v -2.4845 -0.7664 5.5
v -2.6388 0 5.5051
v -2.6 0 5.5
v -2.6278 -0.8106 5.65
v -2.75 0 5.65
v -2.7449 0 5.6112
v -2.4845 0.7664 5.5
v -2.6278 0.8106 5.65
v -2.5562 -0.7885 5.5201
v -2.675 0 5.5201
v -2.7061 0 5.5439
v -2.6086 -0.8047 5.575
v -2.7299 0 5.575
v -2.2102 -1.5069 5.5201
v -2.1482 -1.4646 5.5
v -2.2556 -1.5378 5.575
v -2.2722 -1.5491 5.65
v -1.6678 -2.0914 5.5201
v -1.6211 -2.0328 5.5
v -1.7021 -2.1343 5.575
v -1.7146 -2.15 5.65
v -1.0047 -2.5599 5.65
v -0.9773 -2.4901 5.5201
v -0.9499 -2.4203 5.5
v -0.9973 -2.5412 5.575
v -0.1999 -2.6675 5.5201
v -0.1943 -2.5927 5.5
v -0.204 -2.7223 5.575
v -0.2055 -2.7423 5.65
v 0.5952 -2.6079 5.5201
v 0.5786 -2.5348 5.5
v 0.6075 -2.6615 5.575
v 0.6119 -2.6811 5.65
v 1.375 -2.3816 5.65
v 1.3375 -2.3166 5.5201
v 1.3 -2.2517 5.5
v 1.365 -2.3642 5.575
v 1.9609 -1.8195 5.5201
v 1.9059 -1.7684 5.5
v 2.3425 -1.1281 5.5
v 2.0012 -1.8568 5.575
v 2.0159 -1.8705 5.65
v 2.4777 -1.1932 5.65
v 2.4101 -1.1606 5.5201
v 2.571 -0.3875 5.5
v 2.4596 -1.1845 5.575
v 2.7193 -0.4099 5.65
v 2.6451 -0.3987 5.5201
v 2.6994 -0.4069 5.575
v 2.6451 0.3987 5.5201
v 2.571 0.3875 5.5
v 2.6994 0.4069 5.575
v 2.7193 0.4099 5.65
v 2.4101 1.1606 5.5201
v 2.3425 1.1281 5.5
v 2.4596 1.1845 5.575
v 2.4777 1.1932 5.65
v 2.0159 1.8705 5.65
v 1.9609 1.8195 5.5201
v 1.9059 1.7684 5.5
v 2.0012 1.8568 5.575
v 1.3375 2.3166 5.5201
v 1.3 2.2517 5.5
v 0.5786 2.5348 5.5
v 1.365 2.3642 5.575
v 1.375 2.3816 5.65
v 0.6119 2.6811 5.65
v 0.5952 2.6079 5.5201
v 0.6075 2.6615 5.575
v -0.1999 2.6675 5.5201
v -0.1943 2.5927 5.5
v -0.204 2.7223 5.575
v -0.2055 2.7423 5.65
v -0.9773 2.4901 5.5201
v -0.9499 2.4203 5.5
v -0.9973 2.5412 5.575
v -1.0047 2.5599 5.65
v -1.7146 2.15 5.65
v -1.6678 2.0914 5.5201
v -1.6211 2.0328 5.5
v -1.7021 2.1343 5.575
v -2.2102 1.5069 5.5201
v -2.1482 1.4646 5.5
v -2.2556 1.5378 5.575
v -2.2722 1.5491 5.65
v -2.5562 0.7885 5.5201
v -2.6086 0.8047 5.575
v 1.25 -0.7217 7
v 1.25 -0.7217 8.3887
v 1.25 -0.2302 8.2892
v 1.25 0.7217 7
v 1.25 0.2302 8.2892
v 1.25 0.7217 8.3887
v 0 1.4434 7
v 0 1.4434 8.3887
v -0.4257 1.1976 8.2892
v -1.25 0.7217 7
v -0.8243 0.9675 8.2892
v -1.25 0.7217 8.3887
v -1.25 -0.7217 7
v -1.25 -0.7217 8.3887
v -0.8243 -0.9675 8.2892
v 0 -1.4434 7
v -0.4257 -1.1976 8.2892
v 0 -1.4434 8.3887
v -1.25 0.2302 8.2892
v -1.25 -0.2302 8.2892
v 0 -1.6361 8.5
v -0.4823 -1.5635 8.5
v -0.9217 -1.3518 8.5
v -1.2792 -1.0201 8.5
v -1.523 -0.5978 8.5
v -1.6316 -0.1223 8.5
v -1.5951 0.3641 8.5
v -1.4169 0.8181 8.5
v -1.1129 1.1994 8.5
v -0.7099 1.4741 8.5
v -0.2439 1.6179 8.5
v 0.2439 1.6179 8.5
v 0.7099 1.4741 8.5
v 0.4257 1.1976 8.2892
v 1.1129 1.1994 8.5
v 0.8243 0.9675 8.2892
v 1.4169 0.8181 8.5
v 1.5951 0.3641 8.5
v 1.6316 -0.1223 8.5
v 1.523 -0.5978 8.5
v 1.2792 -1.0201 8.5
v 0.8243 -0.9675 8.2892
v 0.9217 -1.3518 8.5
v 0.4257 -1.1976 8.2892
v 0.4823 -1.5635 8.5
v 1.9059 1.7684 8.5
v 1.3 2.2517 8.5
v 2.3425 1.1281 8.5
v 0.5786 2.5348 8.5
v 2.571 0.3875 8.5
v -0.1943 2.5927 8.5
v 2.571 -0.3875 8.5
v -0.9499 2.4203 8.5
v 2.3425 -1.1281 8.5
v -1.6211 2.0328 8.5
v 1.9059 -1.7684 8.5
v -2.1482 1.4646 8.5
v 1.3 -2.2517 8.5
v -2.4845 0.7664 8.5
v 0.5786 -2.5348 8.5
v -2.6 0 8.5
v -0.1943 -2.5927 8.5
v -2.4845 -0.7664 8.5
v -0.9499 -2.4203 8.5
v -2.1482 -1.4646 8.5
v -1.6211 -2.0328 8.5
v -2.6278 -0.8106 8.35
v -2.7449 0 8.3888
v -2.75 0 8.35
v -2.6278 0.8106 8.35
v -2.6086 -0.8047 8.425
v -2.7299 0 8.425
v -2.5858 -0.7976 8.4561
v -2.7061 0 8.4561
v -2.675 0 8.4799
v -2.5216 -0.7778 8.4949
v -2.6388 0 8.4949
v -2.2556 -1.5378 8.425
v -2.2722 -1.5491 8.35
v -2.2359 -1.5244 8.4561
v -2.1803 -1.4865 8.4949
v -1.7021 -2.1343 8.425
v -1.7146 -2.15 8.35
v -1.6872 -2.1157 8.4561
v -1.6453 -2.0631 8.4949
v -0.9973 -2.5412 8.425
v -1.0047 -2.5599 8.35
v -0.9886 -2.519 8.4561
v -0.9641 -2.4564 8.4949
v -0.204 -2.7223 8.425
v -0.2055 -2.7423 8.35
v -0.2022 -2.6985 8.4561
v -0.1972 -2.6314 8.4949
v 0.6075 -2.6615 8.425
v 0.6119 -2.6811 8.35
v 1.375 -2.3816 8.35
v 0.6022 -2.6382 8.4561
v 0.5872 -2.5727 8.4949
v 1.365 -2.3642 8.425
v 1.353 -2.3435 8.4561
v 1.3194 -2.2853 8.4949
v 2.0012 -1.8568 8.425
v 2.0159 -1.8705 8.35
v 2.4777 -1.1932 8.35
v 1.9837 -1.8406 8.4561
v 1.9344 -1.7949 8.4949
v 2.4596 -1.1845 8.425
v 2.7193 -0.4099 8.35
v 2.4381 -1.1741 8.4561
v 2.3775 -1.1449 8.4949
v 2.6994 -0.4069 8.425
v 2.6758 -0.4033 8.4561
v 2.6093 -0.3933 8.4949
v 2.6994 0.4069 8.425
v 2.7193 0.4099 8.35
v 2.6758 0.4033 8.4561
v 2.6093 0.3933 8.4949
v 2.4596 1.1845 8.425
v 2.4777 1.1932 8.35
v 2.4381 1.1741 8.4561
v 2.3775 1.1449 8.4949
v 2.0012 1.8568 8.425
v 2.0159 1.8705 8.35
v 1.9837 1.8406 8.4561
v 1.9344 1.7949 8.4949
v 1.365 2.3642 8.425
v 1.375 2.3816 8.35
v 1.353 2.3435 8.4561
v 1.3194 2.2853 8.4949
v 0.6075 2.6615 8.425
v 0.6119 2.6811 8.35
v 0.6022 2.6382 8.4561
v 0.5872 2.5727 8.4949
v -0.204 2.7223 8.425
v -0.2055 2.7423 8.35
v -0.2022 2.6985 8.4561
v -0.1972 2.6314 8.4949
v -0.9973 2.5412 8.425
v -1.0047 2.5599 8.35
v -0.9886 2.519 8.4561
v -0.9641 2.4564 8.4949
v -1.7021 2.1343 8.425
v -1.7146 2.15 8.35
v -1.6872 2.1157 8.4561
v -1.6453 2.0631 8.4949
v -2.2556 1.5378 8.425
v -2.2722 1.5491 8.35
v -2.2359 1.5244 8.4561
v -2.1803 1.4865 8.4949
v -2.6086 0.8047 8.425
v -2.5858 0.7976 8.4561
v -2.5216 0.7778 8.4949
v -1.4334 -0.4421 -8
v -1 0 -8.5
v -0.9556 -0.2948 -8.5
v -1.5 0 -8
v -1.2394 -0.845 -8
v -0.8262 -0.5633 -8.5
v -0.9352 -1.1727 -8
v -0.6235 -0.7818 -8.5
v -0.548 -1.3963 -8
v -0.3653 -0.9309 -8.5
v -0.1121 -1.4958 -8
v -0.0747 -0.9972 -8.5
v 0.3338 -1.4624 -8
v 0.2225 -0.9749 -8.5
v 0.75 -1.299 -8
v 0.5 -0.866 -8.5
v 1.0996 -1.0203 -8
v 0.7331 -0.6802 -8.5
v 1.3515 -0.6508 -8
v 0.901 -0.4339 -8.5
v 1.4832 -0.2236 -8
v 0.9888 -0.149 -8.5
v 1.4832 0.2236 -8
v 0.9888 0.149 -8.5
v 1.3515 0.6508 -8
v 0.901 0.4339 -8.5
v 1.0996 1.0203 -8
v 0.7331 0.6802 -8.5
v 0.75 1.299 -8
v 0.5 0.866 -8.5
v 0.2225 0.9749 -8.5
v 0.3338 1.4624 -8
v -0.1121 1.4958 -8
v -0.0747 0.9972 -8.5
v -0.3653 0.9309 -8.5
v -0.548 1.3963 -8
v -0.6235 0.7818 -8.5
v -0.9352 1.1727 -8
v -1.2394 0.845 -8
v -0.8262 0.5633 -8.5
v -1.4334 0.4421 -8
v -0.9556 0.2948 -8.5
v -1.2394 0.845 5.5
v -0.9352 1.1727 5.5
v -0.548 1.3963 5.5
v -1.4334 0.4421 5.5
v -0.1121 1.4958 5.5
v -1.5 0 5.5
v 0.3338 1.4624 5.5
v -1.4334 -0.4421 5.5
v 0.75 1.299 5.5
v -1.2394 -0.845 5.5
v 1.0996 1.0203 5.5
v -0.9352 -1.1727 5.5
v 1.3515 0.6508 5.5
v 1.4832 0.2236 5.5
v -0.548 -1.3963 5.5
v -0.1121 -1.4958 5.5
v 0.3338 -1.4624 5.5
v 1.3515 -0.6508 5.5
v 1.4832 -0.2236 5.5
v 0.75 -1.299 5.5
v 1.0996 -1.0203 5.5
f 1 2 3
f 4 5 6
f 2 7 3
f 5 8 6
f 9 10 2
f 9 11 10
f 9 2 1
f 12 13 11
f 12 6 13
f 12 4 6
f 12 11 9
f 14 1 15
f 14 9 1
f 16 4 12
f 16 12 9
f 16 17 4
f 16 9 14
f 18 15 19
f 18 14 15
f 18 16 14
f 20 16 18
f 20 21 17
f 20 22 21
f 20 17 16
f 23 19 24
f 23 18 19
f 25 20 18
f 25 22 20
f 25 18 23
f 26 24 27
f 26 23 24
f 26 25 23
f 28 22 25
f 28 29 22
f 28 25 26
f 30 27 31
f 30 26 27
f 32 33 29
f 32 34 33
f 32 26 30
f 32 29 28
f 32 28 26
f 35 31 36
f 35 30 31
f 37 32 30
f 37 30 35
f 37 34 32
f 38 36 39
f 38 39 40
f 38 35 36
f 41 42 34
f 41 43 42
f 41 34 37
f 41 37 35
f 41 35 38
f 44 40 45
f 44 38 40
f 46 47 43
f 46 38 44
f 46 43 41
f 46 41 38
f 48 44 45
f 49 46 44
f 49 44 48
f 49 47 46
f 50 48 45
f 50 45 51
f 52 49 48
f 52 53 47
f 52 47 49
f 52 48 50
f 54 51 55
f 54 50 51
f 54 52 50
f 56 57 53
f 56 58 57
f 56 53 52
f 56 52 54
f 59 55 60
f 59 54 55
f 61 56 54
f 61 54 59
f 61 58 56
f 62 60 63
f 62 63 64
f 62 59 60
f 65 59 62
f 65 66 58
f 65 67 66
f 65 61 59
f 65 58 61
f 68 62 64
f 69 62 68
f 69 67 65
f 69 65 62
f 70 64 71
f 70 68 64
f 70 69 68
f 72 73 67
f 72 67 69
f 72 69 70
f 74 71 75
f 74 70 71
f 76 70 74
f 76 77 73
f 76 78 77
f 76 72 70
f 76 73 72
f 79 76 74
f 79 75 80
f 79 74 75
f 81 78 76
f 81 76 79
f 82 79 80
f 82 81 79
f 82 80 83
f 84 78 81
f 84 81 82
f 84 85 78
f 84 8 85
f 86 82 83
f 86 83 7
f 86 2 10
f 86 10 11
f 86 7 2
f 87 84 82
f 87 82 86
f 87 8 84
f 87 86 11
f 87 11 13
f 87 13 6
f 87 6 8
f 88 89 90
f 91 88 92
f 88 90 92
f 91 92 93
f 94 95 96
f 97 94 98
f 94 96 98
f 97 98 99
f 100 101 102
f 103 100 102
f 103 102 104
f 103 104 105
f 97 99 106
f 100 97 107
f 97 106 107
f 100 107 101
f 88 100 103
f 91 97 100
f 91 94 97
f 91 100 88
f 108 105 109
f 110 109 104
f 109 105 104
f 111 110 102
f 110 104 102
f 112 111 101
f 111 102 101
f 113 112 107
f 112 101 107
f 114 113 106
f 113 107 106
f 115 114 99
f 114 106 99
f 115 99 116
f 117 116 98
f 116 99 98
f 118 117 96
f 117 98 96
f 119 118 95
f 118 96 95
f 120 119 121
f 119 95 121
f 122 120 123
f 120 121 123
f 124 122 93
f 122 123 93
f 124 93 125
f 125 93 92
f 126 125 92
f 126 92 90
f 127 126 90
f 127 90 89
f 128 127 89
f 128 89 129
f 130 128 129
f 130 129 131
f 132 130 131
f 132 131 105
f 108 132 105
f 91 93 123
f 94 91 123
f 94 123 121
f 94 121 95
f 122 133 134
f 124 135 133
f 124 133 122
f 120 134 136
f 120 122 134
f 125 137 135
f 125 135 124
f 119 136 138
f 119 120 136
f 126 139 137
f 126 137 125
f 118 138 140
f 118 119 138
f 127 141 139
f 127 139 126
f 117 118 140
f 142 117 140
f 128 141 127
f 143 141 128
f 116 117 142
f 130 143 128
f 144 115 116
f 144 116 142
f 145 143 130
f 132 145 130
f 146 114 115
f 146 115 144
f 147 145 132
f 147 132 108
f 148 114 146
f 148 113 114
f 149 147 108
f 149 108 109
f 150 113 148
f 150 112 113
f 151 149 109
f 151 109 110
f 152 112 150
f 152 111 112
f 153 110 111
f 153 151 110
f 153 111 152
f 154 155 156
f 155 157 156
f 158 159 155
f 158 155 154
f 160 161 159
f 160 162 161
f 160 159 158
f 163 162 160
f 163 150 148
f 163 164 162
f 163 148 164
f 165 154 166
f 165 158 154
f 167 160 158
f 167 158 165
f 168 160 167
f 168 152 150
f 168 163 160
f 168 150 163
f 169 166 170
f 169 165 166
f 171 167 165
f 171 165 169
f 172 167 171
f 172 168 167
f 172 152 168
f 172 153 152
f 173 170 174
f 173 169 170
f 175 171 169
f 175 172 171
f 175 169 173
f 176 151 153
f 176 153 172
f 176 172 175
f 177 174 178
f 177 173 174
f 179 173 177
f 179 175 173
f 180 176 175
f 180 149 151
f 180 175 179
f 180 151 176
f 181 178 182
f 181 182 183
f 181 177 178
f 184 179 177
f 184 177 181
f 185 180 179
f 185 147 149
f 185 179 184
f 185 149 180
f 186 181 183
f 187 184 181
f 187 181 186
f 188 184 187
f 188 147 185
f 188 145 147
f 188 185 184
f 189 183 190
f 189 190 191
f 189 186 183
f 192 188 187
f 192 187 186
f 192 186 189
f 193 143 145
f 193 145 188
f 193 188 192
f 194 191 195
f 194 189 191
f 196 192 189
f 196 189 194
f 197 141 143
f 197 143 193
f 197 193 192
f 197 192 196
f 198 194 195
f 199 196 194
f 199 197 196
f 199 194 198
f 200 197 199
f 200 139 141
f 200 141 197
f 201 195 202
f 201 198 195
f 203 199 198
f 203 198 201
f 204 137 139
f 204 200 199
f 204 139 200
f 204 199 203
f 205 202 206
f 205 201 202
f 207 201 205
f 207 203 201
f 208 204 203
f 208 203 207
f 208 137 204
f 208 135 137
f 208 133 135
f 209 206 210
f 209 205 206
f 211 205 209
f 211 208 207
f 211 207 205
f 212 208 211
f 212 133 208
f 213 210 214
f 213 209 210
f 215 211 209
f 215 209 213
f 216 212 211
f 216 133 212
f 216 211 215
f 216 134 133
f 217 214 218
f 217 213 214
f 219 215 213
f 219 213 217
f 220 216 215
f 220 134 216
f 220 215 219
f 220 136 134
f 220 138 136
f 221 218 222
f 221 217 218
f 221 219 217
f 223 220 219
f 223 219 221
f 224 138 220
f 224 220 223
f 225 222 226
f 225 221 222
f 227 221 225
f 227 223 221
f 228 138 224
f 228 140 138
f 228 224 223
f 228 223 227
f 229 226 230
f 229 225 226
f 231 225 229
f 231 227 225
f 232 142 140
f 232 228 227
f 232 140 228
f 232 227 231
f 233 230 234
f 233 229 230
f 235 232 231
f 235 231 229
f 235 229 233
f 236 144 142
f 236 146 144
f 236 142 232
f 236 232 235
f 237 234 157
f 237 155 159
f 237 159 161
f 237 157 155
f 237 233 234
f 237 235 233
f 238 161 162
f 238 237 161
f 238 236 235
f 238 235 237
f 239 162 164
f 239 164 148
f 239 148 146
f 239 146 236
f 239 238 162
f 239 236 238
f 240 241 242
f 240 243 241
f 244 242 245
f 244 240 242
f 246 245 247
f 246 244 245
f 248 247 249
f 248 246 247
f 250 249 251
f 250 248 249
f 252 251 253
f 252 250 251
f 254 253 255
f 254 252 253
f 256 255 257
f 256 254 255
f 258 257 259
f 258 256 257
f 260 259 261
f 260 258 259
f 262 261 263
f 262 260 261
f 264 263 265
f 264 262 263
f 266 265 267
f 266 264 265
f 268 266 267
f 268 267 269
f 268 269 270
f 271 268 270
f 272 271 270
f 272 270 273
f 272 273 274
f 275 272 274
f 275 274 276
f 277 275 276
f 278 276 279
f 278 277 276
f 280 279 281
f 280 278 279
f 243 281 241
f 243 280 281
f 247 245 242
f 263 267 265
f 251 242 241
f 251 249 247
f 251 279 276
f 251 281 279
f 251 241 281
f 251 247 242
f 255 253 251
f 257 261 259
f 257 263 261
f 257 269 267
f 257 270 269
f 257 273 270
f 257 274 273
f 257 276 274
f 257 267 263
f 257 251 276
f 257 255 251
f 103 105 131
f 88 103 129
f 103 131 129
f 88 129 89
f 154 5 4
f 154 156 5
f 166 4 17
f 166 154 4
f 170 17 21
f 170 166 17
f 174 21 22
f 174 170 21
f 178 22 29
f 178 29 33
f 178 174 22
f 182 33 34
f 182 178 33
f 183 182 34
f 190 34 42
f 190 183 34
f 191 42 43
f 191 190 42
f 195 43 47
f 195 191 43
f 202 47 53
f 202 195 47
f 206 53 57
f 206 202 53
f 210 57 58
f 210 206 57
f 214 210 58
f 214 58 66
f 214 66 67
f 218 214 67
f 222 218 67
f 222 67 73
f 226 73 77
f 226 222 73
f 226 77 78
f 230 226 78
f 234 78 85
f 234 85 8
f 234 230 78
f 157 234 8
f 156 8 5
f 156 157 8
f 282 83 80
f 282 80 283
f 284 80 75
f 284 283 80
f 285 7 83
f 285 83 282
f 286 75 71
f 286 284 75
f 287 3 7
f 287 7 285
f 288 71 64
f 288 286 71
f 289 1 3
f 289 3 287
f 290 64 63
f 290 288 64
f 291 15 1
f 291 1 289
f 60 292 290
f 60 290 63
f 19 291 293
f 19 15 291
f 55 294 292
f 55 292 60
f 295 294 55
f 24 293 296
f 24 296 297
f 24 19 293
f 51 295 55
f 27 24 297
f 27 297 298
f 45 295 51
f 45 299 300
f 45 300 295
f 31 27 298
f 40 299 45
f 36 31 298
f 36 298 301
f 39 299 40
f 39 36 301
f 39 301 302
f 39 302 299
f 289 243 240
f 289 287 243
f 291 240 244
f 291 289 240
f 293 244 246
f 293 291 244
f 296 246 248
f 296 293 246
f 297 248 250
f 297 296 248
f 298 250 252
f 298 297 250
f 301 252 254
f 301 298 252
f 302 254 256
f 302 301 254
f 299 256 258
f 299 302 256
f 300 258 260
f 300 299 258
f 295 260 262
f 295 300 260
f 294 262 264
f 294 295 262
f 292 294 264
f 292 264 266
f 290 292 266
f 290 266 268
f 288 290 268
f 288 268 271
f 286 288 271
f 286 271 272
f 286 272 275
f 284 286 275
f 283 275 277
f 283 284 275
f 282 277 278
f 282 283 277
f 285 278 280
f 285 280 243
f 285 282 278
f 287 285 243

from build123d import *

# Parameters (mm, degrees)
CUT_EXTRUDE1_START = 8.5
CUT_EXTRUDE1_DEPTH = 1.5


with BuildPart() as part:
    # Sketch2 → Revolve1 (revolve)
    with BuildSketch(Plane(origin=(0, 0, 0), x_dir=(0, 0, -1), z_dir=(1, 0, 0)), mode=Mode.PRIVATE) as revolve1_sk:
        with BuildLine():
            Line((8.5, 0), (8.5, 1))
            Line((8.5, 1), (8, 1.5))
            Line((8, 1.5), (-5.5, 1.5))
            Line((-5.5, 1.5), (-5.5, 2.6))
            ThreePointArc((-5.5, 2.6), (-5.543933983, 2.706066017), (-5.65, 2.75))
            Line((-5.65, 2.75), (-8.35, 2.75))
            ThreePointArc((-8.35, 2.75), (-8.456066017, 2.706066017), (-8.5, 2.6))
            Line((-8.5, 2.6), (-8.5, 0))
            Line((-8.5, 0), (8.5, 0))
        make_face()
    revolve(revolve1_sk.sketch.rotate(Axis((0, 0, -8.5), (0, 0, 1)), 90), axis=Axis((0, 0, -8.5), (0, 0, 1)))

    # Sketch3 → Cut-Extrude1 (cut)
    with BuildSketch(Plane.XY.offset(CUT_EXTRUDE1_START)):
        Polygon((-1.25, 0.721687836), (-1.25, -0.721687836), (0, -1.443375673), (1.25, -0.721687836), (1.25, 0.721687836), (0, 1.443375673), align=None)
    extrude(amount=-CUT_EXTRUDE1_DEPTH, mode=Mode.SUBTRACT)

    # Cut-Extrude2 cone 1 section (through the dimple's axis) → Cut-Extrude2 (revolve, cut)
    with BuildSketch(Plane(origin=(0, 0, 8.5), x_dir=(0, -1, 0), z_dir=(1, 0, 0))):
        Polygon((0, 0), (1.636146394, 0), (0, 0.944629561), align=None)
    revolve(axis=Axis((0, 0, 8.5), (0, 0, -1)), mode=Mode.SUBTRACT)


solid = part.part
